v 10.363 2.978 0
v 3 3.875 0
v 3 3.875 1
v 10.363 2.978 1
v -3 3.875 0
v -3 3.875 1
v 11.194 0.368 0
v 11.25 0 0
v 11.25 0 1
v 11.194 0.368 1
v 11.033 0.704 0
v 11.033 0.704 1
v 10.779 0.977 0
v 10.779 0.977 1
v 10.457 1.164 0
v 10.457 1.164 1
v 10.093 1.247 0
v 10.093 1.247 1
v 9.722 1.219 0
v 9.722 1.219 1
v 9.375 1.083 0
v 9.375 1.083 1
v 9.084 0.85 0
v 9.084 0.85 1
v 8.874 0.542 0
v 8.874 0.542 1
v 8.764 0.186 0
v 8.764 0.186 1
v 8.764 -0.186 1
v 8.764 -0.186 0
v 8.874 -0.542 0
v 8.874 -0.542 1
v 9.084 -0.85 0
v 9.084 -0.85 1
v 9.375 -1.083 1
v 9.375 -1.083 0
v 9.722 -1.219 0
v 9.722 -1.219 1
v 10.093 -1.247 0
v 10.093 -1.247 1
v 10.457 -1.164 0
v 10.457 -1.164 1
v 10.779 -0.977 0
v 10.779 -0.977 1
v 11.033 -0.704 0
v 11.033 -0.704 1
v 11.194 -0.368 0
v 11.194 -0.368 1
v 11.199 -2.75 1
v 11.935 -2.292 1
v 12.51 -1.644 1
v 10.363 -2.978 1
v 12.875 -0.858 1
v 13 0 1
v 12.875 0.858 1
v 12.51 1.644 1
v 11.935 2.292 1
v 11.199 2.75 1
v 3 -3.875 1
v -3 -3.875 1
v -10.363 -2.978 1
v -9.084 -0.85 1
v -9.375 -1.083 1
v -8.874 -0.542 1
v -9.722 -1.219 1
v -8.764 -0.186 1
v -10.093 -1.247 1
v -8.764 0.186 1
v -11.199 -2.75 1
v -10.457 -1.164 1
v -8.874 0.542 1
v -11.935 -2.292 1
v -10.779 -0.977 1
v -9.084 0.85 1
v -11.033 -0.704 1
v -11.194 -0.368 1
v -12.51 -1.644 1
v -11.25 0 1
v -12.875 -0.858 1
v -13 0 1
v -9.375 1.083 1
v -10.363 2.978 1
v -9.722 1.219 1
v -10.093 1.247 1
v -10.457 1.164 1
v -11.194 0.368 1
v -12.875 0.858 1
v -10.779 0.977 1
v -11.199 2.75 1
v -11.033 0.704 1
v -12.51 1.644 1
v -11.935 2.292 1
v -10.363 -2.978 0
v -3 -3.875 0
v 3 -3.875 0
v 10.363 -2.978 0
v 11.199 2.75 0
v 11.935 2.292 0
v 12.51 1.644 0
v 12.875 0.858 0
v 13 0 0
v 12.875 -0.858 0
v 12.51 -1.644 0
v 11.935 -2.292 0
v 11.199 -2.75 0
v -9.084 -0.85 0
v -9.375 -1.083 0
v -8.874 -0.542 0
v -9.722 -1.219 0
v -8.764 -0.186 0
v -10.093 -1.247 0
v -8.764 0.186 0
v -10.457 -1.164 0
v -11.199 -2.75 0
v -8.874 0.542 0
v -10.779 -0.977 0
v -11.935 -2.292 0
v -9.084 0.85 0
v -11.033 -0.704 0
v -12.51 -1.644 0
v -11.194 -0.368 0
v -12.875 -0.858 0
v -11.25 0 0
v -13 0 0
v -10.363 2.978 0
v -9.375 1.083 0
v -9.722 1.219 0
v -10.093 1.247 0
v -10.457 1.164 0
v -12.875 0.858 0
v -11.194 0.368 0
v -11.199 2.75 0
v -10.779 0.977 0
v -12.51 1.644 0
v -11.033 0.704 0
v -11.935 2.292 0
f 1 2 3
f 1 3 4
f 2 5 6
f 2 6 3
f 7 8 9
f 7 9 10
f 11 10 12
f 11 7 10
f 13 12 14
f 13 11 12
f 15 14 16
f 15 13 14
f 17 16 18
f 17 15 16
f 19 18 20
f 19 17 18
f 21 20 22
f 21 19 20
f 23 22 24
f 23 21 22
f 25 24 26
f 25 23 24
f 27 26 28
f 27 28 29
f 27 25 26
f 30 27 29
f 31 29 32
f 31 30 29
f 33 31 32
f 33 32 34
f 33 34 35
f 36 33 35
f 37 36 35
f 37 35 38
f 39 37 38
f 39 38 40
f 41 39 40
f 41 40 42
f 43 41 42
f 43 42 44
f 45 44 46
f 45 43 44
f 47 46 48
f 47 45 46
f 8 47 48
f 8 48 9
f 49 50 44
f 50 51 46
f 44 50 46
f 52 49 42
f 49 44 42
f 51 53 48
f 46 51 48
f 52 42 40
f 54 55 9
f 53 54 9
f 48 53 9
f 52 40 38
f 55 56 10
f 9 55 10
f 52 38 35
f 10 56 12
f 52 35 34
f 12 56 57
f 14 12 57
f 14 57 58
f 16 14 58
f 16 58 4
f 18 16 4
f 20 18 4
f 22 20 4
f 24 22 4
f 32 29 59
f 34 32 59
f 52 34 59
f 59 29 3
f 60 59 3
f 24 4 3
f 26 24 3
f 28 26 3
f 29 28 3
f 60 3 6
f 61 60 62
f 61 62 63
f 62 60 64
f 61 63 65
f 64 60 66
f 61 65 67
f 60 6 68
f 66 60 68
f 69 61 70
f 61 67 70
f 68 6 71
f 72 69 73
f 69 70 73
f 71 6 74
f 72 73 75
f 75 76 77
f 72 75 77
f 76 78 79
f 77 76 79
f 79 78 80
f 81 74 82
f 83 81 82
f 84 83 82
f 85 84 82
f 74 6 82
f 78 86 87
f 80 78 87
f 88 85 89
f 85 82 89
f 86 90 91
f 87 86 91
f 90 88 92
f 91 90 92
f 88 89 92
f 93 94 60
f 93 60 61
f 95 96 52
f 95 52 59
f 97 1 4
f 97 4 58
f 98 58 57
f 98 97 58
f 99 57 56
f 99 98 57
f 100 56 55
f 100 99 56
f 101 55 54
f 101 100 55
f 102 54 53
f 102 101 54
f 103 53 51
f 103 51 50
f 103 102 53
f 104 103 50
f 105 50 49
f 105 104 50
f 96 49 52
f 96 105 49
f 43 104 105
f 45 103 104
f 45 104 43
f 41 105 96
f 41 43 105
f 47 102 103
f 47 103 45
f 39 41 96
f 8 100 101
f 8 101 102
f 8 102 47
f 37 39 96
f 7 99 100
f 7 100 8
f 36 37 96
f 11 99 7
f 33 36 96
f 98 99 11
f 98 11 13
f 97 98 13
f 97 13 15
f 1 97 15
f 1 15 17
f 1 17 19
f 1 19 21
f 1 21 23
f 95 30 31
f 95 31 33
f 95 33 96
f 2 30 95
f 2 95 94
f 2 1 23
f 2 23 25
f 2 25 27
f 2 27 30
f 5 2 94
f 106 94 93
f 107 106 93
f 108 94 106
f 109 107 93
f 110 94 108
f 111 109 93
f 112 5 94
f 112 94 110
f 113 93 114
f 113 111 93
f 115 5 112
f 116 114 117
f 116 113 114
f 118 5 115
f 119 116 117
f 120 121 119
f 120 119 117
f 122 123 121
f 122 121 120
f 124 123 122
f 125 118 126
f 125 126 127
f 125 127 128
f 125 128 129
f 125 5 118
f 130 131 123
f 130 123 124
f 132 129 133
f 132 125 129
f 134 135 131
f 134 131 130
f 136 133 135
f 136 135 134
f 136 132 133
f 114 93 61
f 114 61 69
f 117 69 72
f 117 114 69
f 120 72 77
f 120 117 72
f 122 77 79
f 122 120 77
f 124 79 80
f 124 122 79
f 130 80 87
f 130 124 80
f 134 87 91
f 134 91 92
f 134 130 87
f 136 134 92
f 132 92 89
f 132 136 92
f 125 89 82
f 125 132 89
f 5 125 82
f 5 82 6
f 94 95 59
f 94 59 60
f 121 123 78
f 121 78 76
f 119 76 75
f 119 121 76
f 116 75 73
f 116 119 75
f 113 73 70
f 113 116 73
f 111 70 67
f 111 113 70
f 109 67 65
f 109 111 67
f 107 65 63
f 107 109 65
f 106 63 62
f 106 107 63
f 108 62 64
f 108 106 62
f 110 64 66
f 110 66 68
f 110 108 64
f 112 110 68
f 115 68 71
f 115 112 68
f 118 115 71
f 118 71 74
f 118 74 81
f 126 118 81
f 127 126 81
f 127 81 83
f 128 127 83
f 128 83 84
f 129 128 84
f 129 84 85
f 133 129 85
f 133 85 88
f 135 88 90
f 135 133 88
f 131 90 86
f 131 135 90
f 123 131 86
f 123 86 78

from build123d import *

# Parameters (mm, degrees)
CROQUIS1_R              = 1.25
SALIENTE_EXTRUIR1_DEPTH = 1


with BuildPart() as part:
    # Croquis1 → Saliente-Extruir1 (new body)
    with BuildSketch(Plane.XY):
        with BuildLine():
            Line((3, 3.875), (10.362810685, 2.977980592))
            ThreePointArc((10.362810685, 2.977980592), (13, 0), (10.362810685, -2.977980592))
            Line((10.362810685, -2.977980592), (3, -3.875))
            Line((3, -3.875), (-3, -3.875))
            Line((-3, -3.875), (-10.362810685, -2.977980592))
            ThreePointArc((-10.362810685, -2.977980592), (-13, 0), (-10.362810685, 2.977980592))
            Line((-10.362810685, 2.977980592), (-3, 3.875))
            Line((-3, 3.875), (3, 3.875))
        make_face()
        with Locations((10, 0)):
            Circle(CROQUIS1_R, mode=Mode.SUBTRACT)
        with Locations(Location((-10, 0, 0), (0, 0, 180))):
            Circle(CROQUIS1_R, mode=Mode.SUBTRACT)
    extrude(amount=SALIENTE_EXTRUIR1_DEPTH)


solid = part.part
